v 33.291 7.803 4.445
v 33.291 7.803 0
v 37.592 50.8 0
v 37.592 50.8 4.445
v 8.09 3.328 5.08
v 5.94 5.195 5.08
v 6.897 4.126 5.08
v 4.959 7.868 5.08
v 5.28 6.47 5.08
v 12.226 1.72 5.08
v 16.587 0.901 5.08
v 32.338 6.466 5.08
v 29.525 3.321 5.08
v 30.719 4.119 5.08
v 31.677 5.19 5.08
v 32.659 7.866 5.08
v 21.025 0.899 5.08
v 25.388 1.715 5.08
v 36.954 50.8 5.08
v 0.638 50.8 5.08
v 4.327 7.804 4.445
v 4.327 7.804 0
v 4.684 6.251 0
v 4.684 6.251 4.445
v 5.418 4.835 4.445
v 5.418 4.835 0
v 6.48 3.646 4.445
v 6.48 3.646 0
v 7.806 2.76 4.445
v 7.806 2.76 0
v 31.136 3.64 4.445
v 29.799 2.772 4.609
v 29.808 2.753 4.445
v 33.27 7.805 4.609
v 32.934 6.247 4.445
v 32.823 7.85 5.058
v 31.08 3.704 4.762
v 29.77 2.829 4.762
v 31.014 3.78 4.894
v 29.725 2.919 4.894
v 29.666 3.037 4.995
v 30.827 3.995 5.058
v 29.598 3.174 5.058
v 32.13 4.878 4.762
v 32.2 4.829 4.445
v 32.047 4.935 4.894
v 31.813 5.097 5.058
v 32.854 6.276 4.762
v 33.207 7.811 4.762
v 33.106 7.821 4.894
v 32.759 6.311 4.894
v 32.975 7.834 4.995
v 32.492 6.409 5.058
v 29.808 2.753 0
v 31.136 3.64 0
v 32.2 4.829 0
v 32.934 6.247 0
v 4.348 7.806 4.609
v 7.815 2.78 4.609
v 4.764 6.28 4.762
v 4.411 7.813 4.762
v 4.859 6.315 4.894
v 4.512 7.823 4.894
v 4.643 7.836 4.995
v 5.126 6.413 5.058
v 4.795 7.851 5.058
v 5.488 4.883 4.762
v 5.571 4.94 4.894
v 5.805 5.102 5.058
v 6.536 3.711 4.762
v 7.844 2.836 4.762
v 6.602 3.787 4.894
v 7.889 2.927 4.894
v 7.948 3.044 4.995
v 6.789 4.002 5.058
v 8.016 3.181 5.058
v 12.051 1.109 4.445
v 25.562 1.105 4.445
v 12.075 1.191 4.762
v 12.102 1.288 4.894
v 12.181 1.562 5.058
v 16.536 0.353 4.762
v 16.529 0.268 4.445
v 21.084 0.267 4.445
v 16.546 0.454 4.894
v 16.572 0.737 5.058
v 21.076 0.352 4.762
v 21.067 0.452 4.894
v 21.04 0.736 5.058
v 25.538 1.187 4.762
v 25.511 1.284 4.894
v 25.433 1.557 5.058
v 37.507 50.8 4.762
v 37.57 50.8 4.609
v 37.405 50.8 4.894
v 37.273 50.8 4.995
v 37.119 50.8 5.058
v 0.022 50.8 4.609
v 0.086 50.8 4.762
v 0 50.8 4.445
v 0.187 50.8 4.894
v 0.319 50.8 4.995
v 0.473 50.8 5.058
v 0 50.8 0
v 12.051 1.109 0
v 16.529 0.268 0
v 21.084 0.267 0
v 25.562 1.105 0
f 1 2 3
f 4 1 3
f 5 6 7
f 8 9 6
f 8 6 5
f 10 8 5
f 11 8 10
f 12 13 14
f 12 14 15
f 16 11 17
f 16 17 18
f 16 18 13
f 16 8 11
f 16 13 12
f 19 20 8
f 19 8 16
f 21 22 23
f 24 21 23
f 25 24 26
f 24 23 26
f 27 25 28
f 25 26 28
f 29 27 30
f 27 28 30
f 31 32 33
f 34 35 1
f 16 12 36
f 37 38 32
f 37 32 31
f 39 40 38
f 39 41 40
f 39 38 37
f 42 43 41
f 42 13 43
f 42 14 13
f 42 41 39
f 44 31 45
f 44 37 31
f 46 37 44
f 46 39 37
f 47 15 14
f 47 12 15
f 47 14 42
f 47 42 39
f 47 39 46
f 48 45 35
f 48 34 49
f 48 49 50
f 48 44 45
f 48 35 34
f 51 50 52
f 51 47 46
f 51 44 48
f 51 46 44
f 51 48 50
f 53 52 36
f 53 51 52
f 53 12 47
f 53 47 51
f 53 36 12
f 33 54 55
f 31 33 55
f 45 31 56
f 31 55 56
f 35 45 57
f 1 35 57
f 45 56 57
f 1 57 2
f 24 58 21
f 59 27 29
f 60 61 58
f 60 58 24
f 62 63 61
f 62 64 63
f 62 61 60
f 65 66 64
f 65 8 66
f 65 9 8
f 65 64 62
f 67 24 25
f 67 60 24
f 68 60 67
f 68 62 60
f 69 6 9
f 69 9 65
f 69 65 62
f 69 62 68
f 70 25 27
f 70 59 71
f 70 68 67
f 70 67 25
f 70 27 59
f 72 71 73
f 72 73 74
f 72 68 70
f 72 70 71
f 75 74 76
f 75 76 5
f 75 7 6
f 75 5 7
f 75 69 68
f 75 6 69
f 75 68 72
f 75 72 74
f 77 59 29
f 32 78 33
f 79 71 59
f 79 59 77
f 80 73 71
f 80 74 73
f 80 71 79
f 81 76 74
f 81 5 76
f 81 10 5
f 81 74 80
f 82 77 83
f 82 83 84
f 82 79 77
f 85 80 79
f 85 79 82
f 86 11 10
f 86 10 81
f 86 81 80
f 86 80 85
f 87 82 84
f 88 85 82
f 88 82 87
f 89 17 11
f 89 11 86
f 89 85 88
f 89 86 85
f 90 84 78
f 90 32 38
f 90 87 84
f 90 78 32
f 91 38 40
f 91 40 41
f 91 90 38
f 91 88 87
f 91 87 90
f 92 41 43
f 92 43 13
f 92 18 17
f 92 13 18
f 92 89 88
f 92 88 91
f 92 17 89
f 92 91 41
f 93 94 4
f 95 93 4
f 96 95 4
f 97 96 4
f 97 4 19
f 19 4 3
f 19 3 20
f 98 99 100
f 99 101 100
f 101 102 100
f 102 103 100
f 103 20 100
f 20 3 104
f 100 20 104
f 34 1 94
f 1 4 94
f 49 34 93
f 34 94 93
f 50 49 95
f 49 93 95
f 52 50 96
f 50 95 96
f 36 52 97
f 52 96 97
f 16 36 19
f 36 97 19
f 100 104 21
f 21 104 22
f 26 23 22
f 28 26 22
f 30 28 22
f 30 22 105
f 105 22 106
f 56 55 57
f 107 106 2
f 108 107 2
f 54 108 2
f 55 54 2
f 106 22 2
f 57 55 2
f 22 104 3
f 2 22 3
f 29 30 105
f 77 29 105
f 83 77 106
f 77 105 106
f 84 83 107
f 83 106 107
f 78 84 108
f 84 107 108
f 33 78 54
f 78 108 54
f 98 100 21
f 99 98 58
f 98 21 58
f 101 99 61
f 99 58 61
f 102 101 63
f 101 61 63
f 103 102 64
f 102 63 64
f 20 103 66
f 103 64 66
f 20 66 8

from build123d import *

# Parameters (mm, degrees)
F1_DEPTH = 5.08
F2_R     = 0.635


# Not quite as in the source:
# - a feature names something its author has since deleted; it is built from what else it names


with BuildPart() as f1:
    # F0 (on Top) → F1 (new body)
    with BuildSketch(Plane.XY):
        with BuildLine():
            Line((3.7253e-06, 50.8), (4.3267840925, 7.8043183677))
            ThreePointArc((4.3267840925, 7.8043183677), (5.4175944315, 4.8348440923), (7.8057635016, 2.7601650422))
            ThreePointArc((7.8057635016, 2.7601650422), (18.8061487686, 0.162150538), (29.8082212267, 2.753010822))
            ThreePointArc((29.8082212267, 2.753010822), (32.2000000346, 4.8294123123), (33.2912774596, 7.8028215671))
            Line((33.2912774596, 7.8028215671), (37.5920037253, 50.8))
            Line((37.5920037253, 50.8), (3.7253e-06, 50.8))
        make_face()
    extrude(amount=F1_DEPTH)

    # F2
    f2_edges = [f1.edges().sort_by_distance(p)[0] for p in [
        (18.806149, 0.162151, 5.08),
        (32.2, 4.829412, 5.08),
        (35.441641, 29.301411, 5.08),
        (2.163394, 29.302159, 5.08),
        (5.417594, 4.834844, 5.08),
    ]]
    fillet(f2_edges, radius=F2_R)


solid = f1.part
